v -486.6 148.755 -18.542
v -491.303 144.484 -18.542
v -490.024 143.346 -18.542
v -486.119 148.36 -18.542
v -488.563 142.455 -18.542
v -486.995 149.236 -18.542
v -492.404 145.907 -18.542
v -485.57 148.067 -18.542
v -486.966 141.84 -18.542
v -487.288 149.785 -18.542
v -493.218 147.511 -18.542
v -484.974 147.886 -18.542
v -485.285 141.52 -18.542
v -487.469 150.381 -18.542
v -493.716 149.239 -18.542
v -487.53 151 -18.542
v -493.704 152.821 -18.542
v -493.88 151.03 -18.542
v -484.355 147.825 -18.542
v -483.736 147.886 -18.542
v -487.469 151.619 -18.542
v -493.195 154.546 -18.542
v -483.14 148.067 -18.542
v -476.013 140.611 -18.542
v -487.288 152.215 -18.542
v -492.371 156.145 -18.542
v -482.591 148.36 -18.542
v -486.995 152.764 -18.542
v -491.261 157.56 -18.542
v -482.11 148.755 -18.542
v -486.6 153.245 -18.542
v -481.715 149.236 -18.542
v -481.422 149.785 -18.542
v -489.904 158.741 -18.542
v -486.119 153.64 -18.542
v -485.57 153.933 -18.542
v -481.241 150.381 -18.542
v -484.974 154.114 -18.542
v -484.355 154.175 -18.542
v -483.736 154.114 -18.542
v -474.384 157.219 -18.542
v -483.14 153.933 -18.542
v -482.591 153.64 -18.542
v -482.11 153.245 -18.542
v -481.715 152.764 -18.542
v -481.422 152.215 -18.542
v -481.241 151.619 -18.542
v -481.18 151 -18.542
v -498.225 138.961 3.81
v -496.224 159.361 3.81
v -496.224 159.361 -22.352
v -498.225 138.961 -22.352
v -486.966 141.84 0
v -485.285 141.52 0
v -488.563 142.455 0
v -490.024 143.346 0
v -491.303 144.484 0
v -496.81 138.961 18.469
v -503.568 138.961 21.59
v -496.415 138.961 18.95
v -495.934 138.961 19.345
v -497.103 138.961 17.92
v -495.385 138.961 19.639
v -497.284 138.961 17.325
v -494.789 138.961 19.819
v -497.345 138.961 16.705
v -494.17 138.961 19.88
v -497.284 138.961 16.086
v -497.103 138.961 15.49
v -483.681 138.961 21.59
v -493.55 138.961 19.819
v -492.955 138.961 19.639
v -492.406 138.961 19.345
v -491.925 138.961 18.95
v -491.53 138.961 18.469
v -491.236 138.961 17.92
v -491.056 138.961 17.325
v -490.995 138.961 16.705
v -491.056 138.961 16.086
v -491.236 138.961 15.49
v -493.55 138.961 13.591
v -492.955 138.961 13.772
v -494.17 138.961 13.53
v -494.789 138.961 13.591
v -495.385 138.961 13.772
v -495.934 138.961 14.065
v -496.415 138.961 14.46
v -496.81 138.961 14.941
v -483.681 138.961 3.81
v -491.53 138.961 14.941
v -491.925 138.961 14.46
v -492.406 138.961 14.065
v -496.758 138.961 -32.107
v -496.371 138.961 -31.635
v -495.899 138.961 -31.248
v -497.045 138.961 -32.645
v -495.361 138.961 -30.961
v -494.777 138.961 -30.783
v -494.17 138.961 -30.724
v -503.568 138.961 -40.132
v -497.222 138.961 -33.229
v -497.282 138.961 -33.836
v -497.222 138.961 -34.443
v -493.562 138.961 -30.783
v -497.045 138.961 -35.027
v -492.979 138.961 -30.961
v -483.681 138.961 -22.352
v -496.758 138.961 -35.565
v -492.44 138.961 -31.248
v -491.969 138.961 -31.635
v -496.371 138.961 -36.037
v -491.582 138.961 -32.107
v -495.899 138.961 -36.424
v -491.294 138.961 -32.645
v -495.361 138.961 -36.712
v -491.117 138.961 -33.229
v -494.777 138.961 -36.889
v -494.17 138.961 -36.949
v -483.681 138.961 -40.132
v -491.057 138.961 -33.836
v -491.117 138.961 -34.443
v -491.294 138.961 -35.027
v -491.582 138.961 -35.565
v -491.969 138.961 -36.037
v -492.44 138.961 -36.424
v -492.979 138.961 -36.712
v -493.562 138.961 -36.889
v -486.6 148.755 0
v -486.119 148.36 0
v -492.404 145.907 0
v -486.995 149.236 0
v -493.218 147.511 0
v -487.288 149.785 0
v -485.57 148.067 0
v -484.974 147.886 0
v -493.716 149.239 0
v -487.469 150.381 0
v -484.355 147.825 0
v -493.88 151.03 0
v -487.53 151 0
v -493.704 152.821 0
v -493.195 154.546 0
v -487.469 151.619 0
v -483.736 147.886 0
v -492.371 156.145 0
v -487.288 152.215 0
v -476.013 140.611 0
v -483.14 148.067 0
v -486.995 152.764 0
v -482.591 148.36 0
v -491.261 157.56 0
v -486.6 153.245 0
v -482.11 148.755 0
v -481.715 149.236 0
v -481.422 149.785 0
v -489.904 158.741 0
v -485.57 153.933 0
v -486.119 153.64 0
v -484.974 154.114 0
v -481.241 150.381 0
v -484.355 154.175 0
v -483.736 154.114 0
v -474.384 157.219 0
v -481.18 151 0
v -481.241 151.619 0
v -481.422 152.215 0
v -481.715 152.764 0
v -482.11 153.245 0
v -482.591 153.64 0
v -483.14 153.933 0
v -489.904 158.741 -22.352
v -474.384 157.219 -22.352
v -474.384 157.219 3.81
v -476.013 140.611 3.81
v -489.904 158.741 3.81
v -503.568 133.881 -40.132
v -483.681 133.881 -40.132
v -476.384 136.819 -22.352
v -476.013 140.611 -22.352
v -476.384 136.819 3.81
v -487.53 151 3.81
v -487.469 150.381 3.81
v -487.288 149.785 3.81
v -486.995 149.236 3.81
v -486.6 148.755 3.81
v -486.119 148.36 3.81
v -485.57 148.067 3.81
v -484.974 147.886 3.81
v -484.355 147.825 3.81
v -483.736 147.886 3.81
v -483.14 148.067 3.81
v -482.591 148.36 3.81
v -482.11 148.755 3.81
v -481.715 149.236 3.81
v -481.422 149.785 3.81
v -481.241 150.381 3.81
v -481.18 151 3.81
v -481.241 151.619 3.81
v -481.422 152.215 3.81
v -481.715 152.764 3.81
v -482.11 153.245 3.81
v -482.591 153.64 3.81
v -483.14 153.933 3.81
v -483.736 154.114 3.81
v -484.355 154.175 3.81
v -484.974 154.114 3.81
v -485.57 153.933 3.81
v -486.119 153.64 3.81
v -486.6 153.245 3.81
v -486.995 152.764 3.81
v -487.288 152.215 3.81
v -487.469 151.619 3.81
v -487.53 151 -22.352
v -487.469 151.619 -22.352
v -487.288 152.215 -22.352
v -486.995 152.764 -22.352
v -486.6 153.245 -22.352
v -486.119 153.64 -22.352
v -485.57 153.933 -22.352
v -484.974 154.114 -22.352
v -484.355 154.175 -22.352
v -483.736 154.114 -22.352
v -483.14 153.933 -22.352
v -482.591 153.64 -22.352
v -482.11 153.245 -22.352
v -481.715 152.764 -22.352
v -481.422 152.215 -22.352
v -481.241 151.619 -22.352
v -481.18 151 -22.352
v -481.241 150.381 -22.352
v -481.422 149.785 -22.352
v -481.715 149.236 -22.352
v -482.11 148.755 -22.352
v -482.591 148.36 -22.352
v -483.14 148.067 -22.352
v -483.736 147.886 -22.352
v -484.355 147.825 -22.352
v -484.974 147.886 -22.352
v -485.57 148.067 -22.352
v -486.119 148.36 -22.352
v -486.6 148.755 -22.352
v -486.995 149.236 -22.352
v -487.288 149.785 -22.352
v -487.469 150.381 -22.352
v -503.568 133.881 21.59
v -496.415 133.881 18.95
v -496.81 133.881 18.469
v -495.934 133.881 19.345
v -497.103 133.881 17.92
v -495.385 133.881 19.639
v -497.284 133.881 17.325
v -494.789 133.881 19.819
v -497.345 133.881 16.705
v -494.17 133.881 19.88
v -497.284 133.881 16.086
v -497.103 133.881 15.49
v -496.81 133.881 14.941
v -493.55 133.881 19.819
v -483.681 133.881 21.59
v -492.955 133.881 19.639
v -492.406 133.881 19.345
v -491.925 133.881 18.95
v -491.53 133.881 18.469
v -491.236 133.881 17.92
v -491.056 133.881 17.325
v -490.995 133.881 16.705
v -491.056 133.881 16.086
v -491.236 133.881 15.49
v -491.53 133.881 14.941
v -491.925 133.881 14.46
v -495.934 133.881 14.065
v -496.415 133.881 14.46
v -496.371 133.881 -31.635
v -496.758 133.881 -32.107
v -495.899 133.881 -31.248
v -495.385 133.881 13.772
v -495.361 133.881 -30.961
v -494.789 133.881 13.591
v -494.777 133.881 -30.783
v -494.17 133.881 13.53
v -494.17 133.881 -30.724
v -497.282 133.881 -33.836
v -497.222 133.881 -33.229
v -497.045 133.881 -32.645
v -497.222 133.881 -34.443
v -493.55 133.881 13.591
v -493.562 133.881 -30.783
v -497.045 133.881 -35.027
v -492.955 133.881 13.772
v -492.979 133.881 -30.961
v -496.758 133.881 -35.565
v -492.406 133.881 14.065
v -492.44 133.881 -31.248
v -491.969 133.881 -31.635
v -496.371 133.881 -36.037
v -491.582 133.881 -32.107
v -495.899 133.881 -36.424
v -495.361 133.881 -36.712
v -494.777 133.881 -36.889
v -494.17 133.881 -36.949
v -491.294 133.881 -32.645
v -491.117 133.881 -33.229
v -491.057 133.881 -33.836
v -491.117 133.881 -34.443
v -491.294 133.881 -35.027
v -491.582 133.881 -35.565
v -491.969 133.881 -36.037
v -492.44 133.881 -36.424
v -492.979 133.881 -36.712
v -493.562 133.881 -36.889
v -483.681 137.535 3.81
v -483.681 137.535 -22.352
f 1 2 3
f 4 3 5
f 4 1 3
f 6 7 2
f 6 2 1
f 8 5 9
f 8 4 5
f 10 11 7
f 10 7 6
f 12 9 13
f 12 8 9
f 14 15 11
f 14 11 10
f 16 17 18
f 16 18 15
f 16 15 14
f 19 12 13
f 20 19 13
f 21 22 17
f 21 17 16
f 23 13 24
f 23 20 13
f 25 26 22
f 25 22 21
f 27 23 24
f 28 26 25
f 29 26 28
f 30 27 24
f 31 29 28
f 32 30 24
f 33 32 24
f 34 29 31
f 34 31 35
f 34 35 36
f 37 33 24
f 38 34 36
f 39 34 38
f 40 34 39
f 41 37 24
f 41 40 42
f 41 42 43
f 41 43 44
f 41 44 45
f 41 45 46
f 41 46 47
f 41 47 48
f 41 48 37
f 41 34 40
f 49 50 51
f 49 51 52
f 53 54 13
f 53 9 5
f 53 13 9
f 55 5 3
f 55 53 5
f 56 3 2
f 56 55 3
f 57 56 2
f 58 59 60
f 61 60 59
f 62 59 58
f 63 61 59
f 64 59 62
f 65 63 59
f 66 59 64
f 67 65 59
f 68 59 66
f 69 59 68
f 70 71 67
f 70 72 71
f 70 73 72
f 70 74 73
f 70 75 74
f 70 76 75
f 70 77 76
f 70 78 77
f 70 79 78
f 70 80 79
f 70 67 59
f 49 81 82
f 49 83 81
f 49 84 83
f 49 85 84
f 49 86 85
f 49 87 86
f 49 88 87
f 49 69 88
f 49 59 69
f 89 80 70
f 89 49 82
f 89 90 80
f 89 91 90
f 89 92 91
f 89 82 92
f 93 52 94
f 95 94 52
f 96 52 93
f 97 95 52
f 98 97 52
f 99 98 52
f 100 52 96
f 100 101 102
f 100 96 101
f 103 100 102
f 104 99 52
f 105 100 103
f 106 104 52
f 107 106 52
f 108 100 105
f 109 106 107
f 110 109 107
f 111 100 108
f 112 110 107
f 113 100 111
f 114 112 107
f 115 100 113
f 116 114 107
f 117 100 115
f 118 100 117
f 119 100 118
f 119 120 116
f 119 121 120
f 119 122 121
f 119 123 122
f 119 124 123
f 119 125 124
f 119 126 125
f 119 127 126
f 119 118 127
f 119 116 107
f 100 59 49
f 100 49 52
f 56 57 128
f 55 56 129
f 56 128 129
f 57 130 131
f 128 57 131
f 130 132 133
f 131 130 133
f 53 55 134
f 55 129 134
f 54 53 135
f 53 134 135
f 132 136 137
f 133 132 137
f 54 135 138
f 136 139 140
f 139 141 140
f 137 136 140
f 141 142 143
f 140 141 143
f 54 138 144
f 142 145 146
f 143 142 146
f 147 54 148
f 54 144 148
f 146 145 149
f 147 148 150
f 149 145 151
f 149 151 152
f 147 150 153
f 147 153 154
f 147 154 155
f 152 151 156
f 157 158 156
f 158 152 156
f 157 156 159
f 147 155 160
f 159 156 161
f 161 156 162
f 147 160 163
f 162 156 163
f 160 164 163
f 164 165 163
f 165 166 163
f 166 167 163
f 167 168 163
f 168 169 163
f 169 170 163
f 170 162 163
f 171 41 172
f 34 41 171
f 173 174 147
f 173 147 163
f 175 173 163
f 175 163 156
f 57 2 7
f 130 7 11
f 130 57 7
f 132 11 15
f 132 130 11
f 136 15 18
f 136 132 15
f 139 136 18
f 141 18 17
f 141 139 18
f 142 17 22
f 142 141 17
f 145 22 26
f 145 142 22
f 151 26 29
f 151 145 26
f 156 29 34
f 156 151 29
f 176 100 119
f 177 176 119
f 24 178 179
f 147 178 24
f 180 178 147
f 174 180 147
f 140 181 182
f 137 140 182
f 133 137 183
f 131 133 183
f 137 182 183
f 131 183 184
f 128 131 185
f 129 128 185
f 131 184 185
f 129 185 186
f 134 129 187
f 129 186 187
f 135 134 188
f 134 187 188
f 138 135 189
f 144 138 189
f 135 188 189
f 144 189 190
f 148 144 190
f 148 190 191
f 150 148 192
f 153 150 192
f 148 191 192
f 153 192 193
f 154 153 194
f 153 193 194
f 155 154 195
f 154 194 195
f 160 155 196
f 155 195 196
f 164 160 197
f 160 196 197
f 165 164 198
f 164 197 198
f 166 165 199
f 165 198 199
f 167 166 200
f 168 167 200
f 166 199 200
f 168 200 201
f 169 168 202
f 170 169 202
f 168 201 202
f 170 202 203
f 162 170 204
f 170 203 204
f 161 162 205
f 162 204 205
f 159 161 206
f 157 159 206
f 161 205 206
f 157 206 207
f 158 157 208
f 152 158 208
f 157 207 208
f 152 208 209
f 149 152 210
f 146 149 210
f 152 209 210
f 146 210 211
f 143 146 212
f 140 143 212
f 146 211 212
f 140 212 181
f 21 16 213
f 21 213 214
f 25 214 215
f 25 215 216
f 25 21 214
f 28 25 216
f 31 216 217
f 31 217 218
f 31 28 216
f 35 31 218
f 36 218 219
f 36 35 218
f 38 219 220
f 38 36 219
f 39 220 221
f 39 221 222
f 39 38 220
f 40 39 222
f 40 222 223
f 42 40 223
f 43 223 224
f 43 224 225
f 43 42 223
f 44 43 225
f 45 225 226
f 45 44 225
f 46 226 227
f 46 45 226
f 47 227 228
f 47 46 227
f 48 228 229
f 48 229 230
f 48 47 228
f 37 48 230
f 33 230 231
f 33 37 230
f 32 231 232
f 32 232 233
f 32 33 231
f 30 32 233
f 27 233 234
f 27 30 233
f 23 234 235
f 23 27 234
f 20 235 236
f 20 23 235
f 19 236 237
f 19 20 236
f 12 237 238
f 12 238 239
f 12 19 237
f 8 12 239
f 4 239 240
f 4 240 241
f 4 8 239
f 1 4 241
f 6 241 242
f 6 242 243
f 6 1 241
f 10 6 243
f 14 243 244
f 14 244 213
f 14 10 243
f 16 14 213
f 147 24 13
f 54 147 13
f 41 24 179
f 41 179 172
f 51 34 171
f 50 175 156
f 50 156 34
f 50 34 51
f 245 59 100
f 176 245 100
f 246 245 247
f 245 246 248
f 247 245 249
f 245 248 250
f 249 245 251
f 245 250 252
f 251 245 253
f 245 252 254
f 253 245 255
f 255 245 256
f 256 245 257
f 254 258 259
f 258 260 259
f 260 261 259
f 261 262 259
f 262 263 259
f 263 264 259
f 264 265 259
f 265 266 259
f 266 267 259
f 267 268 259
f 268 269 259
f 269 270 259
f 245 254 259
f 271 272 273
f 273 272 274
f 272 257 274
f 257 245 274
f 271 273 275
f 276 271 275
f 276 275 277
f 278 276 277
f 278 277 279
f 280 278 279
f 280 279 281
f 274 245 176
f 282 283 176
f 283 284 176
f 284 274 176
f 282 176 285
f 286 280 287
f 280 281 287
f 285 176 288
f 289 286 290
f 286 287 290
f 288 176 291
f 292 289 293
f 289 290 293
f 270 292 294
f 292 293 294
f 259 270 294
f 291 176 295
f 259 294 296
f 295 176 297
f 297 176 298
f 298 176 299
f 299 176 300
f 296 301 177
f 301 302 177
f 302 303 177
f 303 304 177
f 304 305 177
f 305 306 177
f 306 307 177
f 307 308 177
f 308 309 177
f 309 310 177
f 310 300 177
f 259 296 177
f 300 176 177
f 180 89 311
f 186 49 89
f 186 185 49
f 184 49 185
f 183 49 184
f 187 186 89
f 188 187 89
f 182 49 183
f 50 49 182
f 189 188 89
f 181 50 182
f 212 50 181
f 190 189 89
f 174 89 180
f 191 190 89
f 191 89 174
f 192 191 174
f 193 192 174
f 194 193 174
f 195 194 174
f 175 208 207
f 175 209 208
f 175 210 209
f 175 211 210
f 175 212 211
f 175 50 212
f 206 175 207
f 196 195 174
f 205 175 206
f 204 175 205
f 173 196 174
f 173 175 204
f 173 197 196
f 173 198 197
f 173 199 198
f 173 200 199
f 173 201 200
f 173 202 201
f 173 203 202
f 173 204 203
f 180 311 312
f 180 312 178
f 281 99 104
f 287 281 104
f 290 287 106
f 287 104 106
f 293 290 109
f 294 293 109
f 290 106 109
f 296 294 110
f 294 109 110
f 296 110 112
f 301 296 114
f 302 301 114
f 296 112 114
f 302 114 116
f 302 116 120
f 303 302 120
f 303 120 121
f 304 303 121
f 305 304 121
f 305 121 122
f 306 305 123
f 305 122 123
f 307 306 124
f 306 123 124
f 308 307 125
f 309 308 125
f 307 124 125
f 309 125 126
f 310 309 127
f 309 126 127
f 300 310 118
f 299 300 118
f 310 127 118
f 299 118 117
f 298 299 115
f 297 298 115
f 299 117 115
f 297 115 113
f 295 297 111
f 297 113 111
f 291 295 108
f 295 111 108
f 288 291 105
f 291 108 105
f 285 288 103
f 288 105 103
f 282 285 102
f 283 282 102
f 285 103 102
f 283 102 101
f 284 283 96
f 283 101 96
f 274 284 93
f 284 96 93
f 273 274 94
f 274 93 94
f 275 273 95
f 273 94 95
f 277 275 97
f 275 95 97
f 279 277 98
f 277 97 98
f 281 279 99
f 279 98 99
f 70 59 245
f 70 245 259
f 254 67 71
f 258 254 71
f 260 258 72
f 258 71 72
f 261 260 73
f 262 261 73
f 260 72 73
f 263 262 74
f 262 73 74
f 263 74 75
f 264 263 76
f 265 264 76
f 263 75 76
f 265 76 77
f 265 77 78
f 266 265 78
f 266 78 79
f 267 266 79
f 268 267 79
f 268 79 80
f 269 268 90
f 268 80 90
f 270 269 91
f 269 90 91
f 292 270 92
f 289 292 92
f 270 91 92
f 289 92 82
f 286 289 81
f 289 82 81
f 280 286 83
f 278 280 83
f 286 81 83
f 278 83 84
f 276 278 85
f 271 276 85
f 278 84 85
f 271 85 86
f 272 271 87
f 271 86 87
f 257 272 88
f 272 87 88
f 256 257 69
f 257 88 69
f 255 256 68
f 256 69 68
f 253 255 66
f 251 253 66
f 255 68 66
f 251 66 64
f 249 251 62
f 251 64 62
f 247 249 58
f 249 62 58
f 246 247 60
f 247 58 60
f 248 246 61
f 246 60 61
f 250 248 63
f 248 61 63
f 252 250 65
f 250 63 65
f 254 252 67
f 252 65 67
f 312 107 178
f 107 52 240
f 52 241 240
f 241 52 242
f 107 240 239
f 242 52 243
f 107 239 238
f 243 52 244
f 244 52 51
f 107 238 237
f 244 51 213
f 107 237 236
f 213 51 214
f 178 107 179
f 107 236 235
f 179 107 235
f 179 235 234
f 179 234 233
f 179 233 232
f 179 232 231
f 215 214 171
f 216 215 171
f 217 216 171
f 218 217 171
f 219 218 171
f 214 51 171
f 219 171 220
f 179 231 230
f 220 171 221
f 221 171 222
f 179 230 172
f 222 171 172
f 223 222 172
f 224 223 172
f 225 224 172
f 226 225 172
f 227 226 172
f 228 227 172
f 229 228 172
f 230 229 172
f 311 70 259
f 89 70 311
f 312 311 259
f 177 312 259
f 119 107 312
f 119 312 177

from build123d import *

# Parameters (mm, degrees)
BOSS_EXTRUDE1_DEPTH = 22.352
BOSS_EXTRUDE2_START = -3.81
SKETCH2_R           = 3.175
BOSS_EXTRUDE2_DEPTH = 3.81
BOSS_EXTRUDE4_START = 3.81
SKETCH3_R           = 3.175
BOSS_EXTRUDE4_DEPTH = 3.81
SKETCH4_W           = 19.88678917
SKETCH4_H           = 61.722
BOSS_EXTRUDE5_DEPTH = 5.08
SKETCH6_R           = 3.175
SKETCH6_R_2         = 3.112599105
CUT_EXTRUDE2_DEPTH  = 5.08


with BuildPart() as part:
    # Sketch1 → Boss-Extrude1 (new body)
    with BuildSketch(Plane.XY):
        with BuildLine():
            Line((-476.384421201, 136.819327006), (-476.01254536, 140.611135065))
            Line((-476.01254536, 140.611135065), (-485.284620904, 141.520479852))
            ThreePointArc((-485.284620904, 141.520479852), (-488.563156596, 142.455032775), (-491.302607825, 144.484217934))
            ThreePointArc((-491.302607825, 144.484217934), (-493.83445145, 151.929689602), (-489.904354663, 158.741416237))
            Line((-489.904354663, 158.741416237), (-496.224034762, 159.361209305))
            Line((-496.224034762, 159.361209305), (-498.224726786, 138.961281946))
            Line((-498.224726786, 138.961281946), (-476.384421201, 136.819327006))
        make_face()
    extrude(amount=-BOSS_EXTRUDE1_DEPTH)

    # Sketch2 → Boss-Extrude2 (add)
    with BuildSketch(Plane(origin=(0, 0, -22.352), x_dir=(-1, 0, 0), z_dir=(0, 0, -1)).offset(BOSS_EXTRUDE2_START)):
        with BuildLine():
            Line((474.383729176, 157.219254365), (489.904354663, 158.741416237))
            ThreePointArc((489.904354663, 158.741416237), (493.55465351, 148.532058286), (485.284620904, 141.520479852))
            Line((485.284620904, 141.520479852), (476.01254536, 140.611135065))
            Line((476.01254536, 140.611135065), (474.383729176, 157.219254365))
        make_face()
        with Locations((484.354931302, 151)):
            Circle(SKETCH2_R, mode=Mode.SUBTRACT)
    extrude(amount=BOSS_EXTRUDE2_DEPTH)

    # Sketch3 → Boss-Extrude4 (add)
    # profile 1 of 2: a face of its own
    with BuildSketch(Plane.XY.offset(BOSS_EXTRUDE4_START)):
        with BuildLine():
            Line((-474.383729176, 157.219254365), (-489.904354663, 158.741416237))
            ThreePointArc((-489.904354663, 158.741416237), (-493.55465351, 148.532058286), (-485.284620904, 141.520479852))
            Line((-485.284620904, 141.520479852), (-476.01254536, 140.611135065))
            Line((-476.01254536, 140.611135065), (-474.383729176, 157.219254365))
        make_face()
        with Locations(Location((-484.354931302, 151, 0), (0, 0, 180))):
            Circle(SKETCH3_R, mode=Mode.SUBTRACT)
    # profile 2 of 2: a face of its own
    with BuildSketch(Plane.XY.offset(BOSS_EXTRUDE4_START)):
        with BuildLine():
            Line((-476.01254536, 140.611135065), (-485.284620904, 141.520479852))
            ThreePointArc((-485.284620904, 141.520479852), (-493.55465351, 148.532058286), (-489.904354663, 158.741416237))
            Line((-489.904354663, 158.741416237), (-496.224034762, 159.361209305))
            Line((-496.224034762, 159.361209305), (-498.224726786, 138.961281946))
            Line((-498.224726786, 138.961281946), (-476.384421201, 136.819327006))
            Line((-476.384421201, 136.819327006), (-476.01254536, 140.611135065))
        make_face()
    extrude(amount=-BOSS_EXTRUDE4_DEPTH)

    # Sketch4 → Boss-Extrude5 (add)
    with BuildSketch(Plane(origin=(0, 138.961281946, 0), x_dir=(1, 0, 0), z_dir=(0, 1, 0))):
        with Locations((-493.624258186, 9.271)):
            Rectangle(SKETCH4_W, SKETCH4_H)
    extrude(amount=-BOSS_EXTRUDE5_DEPTH)

    # Sketch6 → Cut-Extrude2 (cut)
    with BuildSketch(Plane(origin=(0, 138.961281946, 0), x_dir=(1, 0, 0), z_dir=(0, 1, 0))):
        with Locations(Location((-494.169652771, -16.705193035, 0), (0, 0, 270))):
            Circle(SKETCH6_R)
        with Locations(Location((-494.169652771, 33.836204424, 0), (0, 0, 270))):
            Circle(SKETCH6_R_2)
    extrude(amount=-CUT_EXTRUDE2_DEPTH, mode=Mode.SUBTRACT)


solid = part.part
